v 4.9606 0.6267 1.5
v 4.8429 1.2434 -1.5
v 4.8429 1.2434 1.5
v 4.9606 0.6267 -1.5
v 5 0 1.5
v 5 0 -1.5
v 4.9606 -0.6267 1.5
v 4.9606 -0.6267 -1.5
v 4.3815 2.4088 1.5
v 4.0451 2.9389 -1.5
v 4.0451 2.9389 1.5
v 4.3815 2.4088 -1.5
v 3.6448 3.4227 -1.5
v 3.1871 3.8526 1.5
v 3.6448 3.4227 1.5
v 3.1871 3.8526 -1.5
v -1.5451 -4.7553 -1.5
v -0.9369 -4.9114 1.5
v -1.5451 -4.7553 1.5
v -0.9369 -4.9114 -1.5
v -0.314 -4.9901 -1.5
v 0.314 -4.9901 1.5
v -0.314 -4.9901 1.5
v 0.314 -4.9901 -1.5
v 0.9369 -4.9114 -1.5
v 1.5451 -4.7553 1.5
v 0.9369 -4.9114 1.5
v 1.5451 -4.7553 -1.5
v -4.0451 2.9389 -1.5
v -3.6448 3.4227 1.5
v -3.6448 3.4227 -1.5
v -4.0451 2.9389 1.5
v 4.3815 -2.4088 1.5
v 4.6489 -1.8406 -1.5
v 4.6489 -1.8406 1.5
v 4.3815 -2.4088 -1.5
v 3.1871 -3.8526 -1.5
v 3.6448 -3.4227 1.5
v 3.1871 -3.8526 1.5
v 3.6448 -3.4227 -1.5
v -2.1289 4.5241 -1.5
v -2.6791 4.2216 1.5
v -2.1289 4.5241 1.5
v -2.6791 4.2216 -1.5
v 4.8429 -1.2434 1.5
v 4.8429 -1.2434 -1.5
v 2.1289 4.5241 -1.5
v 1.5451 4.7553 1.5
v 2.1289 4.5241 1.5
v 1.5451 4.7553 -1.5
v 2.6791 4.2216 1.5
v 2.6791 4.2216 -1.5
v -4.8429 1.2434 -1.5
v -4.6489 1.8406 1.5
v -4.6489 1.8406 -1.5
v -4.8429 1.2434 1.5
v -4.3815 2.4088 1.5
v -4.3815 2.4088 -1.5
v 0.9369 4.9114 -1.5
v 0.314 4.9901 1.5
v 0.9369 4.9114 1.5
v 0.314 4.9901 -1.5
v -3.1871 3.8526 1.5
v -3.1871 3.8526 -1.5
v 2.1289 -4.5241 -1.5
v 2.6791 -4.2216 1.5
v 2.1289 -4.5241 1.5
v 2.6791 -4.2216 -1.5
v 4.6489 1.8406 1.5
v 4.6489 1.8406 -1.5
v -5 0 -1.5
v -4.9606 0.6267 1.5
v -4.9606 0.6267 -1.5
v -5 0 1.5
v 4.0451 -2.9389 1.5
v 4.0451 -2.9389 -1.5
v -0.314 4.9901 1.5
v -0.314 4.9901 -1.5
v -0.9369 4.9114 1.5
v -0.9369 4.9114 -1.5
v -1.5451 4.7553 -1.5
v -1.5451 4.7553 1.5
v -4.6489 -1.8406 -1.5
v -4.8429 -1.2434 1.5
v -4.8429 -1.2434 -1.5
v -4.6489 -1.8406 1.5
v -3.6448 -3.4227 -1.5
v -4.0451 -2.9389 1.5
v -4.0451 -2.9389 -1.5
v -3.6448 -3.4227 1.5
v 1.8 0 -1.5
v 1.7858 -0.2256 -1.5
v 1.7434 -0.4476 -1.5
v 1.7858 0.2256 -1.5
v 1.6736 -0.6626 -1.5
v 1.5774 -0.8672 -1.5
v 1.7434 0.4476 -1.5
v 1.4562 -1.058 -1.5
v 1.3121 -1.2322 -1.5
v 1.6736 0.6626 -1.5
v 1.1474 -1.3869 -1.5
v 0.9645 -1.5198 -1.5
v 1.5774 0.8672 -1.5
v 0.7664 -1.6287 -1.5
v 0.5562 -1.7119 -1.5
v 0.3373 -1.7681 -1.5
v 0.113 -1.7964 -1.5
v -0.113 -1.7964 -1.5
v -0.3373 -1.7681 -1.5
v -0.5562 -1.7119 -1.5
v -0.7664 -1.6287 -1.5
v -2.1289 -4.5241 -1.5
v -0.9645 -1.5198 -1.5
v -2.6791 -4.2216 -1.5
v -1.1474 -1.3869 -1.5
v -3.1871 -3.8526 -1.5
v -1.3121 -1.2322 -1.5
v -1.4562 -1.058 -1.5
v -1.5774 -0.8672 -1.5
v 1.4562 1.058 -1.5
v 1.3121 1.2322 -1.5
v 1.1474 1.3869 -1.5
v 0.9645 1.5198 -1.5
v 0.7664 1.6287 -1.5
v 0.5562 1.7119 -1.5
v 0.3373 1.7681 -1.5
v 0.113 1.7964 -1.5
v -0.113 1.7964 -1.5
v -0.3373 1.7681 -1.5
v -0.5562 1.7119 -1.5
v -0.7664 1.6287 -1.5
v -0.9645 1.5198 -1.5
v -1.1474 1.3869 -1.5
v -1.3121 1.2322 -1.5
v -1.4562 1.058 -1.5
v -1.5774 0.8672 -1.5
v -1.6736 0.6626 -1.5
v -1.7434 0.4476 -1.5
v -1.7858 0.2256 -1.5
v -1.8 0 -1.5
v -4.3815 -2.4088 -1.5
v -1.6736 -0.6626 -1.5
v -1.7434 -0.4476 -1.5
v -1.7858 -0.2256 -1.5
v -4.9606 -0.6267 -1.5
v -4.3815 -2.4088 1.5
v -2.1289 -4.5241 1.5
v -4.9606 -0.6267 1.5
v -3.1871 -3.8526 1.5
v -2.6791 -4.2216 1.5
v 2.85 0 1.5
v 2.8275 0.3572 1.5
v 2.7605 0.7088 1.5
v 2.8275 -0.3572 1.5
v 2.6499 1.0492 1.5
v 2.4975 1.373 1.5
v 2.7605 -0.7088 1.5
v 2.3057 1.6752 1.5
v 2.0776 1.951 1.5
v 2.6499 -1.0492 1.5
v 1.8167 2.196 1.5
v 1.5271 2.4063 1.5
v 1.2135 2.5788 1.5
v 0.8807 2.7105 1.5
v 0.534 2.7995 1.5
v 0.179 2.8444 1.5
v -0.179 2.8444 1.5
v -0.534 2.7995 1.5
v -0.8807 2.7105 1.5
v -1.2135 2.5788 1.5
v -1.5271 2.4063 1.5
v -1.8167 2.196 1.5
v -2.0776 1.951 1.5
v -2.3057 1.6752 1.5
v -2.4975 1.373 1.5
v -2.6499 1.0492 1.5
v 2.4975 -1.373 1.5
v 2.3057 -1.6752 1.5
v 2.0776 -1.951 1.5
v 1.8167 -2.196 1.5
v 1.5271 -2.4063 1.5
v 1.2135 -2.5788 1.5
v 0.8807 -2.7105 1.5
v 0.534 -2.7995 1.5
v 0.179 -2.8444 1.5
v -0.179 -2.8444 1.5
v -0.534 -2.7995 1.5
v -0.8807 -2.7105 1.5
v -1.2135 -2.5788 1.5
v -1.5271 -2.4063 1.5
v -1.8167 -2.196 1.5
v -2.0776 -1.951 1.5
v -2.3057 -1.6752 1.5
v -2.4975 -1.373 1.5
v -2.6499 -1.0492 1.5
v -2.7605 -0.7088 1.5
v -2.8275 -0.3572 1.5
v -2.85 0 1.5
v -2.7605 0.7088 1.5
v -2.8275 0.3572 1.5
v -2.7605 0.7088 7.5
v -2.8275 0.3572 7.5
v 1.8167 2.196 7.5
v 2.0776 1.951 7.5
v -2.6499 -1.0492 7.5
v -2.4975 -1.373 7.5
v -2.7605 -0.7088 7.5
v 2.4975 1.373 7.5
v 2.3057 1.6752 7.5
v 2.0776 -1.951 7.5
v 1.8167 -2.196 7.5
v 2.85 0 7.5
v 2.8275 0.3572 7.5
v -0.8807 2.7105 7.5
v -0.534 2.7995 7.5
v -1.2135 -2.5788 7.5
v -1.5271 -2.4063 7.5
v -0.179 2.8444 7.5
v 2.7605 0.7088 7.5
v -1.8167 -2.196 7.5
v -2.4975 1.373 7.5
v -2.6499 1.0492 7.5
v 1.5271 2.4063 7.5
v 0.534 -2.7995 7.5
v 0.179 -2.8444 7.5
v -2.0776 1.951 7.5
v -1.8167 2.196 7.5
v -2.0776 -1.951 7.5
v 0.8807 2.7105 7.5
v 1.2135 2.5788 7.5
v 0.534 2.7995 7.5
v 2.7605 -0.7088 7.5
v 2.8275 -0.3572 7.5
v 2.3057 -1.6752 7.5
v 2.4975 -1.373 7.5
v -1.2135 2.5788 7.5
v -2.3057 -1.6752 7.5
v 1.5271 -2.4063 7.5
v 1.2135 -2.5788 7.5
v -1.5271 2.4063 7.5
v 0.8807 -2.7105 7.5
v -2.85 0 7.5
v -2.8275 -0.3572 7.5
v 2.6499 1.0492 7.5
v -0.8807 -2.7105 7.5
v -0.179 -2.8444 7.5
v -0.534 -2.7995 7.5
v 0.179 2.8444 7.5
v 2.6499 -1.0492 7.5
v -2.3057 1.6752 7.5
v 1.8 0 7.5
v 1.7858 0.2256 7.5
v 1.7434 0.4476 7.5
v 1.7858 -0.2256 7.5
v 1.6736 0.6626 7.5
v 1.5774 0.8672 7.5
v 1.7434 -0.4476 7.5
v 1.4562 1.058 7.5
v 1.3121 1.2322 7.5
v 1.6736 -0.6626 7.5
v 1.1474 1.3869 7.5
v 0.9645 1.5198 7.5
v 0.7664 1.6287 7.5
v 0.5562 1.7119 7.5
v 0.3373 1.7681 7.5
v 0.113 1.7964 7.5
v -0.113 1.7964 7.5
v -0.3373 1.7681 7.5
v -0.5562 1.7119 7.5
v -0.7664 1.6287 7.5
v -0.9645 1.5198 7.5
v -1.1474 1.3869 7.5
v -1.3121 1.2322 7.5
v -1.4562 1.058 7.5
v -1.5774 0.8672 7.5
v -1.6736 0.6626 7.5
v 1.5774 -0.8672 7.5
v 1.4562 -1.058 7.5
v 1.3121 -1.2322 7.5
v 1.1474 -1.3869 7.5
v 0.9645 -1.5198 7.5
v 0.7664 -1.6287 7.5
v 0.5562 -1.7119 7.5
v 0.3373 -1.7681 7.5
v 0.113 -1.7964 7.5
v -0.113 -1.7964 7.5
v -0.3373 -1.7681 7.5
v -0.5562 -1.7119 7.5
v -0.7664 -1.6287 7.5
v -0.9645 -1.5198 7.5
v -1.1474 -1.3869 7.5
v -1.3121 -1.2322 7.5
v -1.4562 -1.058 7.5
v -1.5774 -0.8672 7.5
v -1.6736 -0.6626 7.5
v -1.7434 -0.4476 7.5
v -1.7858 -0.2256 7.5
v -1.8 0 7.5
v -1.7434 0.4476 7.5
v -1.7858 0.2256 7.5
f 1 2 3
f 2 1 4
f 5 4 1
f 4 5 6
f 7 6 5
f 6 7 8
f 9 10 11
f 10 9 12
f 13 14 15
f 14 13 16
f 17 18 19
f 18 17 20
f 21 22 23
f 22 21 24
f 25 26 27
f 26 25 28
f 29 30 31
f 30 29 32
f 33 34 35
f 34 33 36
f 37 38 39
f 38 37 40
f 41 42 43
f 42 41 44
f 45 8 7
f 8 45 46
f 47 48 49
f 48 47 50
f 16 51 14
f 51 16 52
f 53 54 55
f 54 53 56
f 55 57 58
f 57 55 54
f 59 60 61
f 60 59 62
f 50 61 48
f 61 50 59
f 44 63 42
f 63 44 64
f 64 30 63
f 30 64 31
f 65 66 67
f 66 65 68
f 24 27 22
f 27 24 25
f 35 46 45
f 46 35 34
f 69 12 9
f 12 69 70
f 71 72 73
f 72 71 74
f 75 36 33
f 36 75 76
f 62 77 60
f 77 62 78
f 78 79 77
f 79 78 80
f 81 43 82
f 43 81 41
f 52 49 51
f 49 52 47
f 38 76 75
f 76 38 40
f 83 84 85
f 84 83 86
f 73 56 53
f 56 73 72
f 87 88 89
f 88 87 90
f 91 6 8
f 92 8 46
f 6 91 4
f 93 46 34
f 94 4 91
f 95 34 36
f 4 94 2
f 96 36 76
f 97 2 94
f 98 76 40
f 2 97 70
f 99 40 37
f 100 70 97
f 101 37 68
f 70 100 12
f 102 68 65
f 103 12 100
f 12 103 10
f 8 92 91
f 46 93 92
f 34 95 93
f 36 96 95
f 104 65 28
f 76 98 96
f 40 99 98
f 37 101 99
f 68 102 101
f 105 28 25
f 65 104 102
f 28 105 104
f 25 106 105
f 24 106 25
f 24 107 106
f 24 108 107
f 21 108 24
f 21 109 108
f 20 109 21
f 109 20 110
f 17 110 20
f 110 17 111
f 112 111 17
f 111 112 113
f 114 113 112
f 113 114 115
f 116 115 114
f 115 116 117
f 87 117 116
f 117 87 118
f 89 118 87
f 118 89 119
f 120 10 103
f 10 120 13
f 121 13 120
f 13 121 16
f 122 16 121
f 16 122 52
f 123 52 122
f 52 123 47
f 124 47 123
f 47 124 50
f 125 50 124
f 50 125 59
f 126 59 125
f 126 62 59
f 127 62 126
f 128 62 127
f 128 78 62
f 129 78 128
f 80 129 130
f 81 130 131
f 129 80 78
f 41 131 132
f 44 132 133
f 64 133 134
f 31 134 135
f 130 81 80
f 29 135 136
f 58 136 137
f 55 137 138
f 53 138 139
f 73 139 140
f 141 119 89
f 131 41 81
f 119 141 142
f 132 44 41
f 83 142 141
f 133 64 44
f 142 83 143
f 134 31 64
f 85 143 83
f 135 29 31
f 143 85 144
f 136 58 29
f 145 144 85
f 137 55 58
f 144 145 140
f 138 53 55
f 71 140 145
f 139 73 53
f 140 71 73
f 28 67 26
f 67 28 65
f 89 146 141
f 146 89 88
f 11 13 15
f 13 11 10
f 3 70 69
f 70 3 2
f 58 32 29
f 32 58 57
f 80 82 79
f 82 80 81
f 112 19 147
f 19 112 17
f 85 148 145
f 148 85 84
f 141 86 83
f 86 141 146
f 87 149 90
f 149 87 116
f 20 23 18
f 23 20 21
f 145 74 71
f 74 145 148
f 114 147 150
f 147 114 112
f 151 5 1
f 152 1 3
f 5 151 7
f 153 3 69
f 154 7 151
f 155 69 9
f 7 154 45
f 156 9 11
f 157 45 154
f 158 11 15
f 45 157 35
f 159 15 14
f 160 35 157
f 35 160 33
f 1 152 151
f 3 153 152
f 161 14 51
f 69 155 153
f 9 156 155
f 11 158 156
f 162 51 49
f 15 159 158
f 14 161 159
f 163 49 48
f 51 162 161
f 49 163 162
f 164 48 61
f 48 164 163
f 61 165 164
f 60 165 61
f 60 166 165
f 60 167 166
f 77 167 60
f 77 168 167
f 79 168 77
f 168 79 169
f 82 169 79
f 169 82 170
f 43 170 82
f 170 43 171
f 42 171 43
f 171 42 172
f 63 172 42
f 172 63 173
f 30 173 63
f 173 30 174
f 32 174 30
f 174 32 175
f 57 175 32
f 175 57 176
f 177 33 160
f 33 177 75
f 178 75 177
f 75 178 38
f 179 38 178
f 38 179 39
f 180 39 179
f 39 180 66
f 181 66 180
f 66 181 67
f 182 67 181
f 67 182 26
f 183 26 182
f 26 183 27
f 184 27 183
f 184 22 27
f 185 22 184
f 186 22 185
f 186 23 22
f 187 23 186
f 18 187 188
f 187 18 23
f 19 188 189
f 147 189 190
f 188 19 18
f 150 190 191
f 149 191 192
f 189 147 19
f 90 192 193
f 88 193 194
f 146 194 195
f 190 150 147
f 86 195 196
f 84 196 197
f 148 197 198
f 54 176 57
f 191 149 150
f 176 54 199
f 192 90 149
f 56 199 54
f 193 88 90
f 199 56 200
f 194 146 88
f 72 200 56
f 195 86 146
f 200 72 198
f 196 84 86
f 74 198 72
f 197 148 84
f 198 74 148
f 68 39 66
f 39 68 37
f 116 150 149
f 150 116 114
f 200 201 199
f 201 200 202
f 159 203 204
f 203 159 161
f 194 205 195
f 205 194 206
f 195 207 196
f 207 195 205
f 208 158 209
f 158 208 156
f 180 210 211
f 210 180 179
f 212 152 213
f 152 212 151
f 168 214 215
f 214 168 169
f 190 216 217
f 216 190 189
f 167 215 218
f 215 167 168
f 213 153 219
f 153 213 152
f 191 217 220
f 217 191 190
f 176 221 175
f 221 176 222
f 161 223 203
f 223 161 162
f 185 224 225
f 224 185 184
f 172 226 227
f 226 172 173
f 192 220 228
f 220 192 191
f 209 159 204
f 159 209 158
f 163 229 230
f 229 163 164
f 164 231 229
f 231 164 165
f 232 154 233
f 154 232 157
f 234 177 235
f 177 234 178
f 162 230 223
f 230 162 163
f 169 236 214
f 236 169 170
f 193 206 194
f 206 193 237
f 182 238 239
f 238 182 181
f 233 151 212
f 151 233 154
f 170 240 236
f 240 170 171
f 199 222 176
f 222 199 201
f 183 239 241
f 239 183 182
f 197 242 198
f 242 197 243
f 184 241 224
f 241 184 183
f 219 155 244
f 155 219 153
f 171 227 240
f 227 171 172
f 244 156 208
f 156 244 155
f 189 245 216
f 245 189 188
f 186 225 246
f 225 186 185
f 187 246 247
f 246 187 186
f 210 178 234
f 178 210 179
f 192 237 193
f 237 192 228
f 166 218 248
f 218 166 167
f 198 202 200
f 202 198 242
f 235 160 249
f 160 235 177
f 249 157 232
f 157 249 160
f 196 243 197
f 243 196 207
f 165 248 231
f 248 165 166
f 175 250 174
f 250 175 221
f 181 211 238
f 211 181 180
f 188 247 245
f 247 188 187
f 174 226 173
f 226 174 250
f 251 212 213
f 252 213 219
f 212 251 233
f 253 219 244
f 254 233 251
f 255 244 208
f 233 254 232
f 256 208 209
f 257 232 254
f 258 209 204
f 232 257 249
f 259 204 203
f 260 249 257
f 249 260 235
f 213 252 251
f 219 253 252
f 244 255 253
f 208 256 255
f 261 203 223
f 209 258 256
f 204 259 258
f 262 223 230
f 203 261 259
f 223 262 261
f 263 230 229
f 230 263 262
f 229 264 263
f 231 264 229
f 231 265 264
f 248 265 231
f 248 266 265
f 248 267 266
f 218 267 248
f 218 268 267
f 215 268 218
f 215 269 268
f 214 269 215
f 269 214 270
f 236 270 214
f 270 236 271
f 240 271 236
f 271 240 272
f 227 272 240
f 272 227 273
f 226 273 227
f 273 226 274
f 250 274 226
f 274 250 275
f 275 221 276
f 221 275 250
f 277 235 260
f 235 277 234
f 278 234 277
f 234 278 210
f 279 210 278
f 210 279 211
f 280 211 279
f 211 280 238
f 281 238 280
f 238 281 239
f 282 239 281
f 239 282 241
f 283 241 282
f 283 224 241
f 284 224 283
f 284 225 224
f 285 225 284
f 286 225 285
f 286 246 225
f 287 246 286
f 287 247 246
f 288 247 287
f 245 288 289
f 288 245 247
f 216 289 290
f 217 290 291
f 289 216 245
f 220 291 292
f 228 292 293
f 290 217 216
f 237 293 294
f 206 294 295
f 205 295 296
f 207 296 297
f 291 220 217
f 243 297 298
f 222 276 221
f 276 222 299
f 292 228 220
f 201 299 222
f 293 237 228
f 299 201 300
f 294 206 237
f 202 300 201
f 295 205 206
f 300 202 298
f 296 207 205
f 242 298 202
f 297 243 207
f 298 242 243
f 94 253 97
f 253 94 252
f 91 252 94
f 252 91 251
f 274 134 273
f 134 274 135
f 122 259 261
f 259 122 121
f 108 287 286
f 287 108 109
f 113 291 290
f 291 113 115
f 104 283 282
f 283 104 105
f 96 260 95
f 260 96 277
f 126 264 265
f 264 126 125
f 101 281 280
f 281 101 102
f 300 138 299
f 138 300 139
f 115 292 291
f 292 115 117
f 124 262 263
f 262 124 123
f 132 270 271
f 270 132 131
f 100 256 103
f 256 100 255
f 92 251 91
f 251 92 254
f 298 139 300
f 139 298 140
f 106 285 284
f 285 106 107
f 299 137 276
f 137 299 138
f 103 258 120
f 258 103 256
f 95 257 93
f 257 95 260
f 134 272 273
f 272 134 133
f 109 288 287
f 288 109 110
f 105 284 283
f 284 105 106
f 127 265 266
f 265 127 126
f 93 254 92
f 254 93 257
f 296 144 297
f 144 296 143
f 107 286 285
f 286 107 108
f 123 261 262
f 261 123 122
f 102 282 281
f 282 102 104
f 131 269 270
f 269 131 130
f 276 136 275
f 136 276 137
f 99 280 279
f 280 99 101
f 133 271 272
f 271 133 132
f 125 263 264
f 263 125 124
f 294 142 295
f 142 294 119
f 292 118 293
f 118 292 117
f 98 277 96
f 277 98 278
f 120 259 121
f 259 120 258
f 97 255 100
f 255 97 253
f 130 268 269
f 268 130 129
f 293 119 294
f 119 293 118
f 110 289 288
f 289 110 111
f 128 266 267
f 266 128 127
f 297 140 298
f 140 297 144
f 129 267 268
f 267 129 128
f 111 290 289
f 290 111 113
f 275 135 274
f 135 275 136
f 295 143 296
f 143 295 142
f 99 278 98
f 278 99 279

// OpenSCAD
$fn = 50;


difference() {
	union() {
		translate(v = [0, 0, -1.5000000000]) {
			rotate(a = [0, 0, 0]) {
				cylinder(h = 3, r = 5.0000000000);
			}
		}
		translate(v = [0, 0, -1.5000000000]) {
			rotate(a = [0, 0, 0]) {
				cylinder(h = 9, r = 2.8500000000);
			}
		}
	}
	union() {
		translate(v = [0, 0, -125.0000000000]) {
			rotate(a = [0, 0, 0]) {
				cylinder(h = 250, r = 1.8000000000);
			}
		}
	}
}
